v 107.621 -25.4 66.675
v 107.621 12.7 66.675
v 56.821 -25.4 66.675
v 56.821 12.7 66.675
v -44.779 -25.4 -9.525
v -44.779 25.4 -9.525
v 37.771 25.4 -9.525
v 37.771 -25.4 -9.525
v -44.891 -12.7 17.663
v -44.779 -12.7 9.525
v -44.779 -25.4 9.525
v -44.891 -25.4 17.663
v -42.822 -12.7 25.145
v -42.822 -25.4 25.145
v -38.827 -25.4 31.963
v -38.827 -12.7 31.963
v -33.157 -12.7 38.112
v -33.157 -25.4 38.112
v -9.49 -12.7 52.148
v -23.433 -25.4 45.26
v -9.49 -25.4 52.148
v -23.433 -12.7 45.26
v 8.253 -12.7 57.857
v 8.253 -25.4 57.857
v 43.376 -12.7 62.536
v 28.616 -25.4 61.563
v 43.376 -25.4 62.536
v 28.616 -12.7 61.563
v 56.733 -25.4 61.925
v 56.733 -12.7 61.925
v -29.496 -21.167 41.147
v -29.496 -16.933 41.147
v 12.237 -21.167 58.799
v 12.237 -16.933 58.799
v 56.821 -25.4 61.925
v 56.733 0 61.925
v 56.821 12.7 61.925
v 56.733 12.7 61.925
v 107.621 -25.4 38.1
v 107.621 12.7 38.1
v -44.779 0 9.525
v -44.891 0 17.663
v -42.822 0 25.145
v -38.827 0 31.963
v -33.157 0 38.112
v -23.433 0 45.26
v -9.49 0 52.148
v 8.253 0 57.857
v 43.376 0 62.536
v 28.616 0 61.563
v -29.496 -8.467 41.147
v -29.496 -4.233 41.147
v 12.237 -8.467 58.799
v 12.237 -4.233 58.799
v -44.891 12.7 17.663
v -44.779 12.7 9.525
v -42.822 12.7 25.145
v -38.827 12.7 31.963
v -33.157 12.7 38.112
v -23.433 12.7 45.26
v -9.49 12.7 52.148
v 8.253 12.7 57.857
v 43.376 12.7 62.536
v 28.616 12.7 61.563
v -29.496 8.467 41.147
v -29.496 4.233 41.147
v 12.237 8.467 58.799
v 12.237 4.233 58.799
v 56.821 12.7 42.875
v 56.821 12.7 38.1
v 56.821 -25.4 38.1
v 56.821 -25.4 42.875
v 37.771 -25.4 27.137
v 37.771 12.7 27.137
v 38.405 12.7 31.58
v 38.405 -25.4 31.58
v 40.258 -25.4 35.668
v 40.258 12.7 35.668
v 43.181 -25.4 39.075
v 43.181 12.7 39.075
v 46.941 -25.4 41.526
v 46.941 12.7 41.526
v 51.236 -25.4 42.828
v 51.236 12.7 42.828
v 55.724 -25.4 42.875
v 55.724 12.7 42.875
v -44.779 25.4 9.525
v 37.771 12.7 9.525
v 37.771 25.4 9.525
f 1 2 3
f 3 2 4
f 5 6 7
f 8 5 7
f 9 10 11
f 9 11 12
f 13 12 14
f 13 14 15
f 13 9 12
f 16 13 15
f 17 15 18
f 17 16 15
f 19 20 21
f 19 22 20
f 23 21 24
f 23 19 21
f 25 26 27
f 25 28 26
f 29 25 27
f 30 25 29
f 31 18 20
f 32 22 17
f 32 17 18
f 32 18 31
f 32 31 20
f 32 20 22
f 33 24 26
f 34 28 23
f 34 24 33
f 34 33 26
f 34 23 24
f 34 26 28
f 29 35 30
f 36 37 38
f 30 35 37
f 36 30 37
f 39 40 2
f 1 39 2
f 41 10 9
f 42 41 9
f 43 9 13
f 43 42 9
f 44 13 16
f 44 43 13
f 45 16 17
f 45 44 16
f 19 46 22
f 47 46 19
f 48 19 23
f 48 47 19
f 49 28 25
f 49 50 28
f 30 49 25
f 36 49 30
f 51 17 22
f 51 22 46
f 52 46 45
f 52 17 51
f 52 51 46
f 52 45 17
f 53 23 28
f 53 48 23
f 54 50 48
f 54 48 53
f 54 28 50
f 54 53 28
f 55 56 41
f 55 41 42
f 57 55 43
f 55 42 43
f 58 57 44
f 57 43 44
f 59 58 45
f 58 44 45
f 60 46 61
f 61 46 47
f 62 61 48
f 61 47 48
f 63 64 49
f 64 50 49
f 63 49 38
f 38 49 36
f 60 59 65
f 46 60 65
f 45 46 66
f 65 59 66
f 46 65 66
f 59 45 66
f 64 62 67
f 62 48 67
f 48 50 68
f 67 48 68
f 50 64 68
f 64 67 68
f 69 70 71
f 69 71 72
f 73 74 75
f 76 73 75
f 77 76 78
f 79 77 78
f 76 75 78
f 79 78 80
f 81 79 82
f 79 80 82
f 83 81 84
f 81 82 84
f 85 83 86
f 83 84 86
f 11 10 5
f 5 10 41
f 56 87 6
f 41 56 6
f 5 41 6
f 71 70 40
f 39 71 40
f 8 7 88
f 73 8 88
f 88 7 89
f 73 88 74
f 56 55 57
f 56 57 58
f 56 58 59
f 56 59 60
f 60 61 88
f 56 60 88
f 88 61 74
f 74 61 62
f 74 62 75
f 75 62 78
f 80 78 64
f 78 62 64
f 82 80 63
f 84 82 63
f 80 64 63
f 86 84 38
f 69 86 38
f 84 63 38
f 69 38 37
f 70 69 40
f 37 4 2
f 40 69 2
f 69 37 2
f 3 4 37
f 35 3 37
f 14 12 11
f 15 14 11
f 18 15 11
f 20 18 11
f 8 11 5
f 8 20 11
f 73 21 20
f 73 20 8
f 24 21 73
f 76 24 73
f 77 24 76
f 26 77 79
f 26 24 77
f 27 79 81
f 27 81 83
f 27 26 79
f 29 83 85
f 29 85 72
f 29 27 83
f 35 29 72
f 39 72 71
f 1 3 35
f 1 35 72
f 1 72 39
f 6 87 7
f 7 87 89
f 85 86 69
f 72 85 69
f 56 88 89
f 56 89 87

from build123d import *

# Parameters (mm, degrees)
F1_DEPTH = 25.4
F0_W     = 30.6482749184
F0_H     = 19.05
F0_H_2   = 4.7752
F2_DEPTH = 12.7
F3_DEPTH = 25.4


with BuildPart() as f1:
    # F0 (on Front) → F1 (new body)
    with BuildSketch(Plane.XZ):
        Polygon((-44.7792303854, -9.525), (37.7707696146, -9.525), (37.7707696146, 9.525), (18.7207696146, 9.525), (-44.7792303854, 9.525), align=None)
    extrude(amount=-F1_DEPTH)

    # F0 (on Front) → F2 (join, symmetric)
    with BuildSketch(Plane.XZ):
        Polygon((-44.7792303854, -9.525), (37.7707696146, -9.525), (37.7707696146, 9.525), (18.7207696146, 9.525), (-44.7792303854, 9.525), align=None)
        with BuildLine():
            Line((18.7207696146, 9.525), (37.7707696146, 9.525))
            Line((37.7707696146, 9.525), (37.7707696146, 27.1368854333))
            ThreePointArc((37.7707696146, 27.1368854333), (43.1811641643, 39.0745425639), (55.7244902785, 42.8752))
            Line((55.7244902785, 42.8752), (56.8207696146, 42.8752))
            Line((56.8207696146, 42.8752), (56.8207696146, 61.9252))
            Line((56.8207696146, 61.9252), (56.7326441838, 61.9252))
            ThreePointArc((56.7326441838, 61.9252), (30.0666842775, 52.9008594991), (18.7207696146, 27.1368854333))
            Line((18.7207696146, 27.1368854333), (18.7207696146, 9.525))
        make_face()
        with BuildLine():
            add(Edge.make_bspline(
                [(-44.7792303854, 9.525), (-50.61746484, 47.9471649566), (18.7515171766, 66.2469923459), (56.7326441838, 61.9252)],
                knots=[0, 0, 0, 0, 114.2385295712, 114.2385295712, 114.2385295712, 114.2385295712], degree=3))
            Line((-44.7792303854, 9.525), (18.7207696146, 9.525))
            Line((18.7207696146, 9.525), (18.7207696146, 27.1368854333))
            ThreePointArc((18.7207696146, 27.1368854333), (30.0666842775, 52.9008594991), (56.7326441838, 61.9252))
        make_face()
        with Locations((72.1449070738, 52.4002)):
            Rectangle(F0_W, F0_H)
        Polygon((56.8207696146, 66.675), (56.8207696146, 61.9252), (87.469044533, 61.9252), (87.469044533, 42.8752), (87.469044533, 38.1), (107.6207696146, 38.1), (107.6207696146, 66.675), align=None)
        with Locations((72.1449070738, 40.4876)):
            Rectangle(F0_W, F0_H_2)
    extrude(amount=F2_DEPTH, both=True)

    # F0 (on Front) → F3 (join)
    with BuildSketch(Plane.XZ):
        Polygon((-44.7792303854, -9.525), (37.7707696146, -9.525), (37.7707696146, 9.525), (18.7207696146, 9.525), (-44.7792303854, 9.525), align=None)
        with BuildLine():
            Line((18.7207696146, 9.525), (37.7707696146, 9.525))
            Line((37.7707696146, 9.525), (37.7707696146, 27.1368854333))
            ThreePointArc((37.7707696146, 27.1368854333), (43.1811641643, 39.0745425639), (55.7244902785, 42.8752))
            Line((55.7244902785, 42.8752), (56.8207696146, 42.8752))
            Line((56.8207696146, 42.8752), (56.8207696146, 61.9252))
            Line((56.8207696146, 61.9252), (56.7326441838, 61.9252))
            ThreePointArc((56.7326441838, 61.9252), (30.0666842775, 52.9008594991), (18.7207696146, 27.1368854333))
            Line((18.7207696146, 27.1368854333), (18.7207696146, 9.525))
        make_face()
        with BuildLine():
            add(Edge.make_bspline(
                [(-44.7792303854, 9.525), (-50.61746484, 47.9471649566), (18.7515171766, 66.2469923459), (56.7326441838, 61.9252)],
                knots=[0, 0, 0, 0, 114.2385295712, 114.2385295712, 114.2385295712, 114.2385295712], degree=3))
            Line((-44.7792303854, 9.525), (18.7207696146, 9.525))
            Line((18.7207696146, 9.525), (18.7207696146, 27.1368854333))
            ThreePointArc((18.7207696146, 27.1368854333), (30.0666842775, 52.9008594991), (56.7326441838, 61.9252))
        make_face()
        with Locations((72.1449070738, 52.4002)):
            Rectangle(F0_W, F0_H)
        Polygon((56.8207696146, 66.675), (56.8207696146, 61.9252), (87.469044533, 61.9252), (87.469044533, 42.8752), (87.469044533, 38.1), (107.6207696146, 38.1), (107.6207696146, 66.675), align=None)
        with Locations((72.1449070738, 40.4876)):
            Rectangle(F0_W, F0_H_2)
    extrude(amount=F3_DEPTH)


solid = f1.part
